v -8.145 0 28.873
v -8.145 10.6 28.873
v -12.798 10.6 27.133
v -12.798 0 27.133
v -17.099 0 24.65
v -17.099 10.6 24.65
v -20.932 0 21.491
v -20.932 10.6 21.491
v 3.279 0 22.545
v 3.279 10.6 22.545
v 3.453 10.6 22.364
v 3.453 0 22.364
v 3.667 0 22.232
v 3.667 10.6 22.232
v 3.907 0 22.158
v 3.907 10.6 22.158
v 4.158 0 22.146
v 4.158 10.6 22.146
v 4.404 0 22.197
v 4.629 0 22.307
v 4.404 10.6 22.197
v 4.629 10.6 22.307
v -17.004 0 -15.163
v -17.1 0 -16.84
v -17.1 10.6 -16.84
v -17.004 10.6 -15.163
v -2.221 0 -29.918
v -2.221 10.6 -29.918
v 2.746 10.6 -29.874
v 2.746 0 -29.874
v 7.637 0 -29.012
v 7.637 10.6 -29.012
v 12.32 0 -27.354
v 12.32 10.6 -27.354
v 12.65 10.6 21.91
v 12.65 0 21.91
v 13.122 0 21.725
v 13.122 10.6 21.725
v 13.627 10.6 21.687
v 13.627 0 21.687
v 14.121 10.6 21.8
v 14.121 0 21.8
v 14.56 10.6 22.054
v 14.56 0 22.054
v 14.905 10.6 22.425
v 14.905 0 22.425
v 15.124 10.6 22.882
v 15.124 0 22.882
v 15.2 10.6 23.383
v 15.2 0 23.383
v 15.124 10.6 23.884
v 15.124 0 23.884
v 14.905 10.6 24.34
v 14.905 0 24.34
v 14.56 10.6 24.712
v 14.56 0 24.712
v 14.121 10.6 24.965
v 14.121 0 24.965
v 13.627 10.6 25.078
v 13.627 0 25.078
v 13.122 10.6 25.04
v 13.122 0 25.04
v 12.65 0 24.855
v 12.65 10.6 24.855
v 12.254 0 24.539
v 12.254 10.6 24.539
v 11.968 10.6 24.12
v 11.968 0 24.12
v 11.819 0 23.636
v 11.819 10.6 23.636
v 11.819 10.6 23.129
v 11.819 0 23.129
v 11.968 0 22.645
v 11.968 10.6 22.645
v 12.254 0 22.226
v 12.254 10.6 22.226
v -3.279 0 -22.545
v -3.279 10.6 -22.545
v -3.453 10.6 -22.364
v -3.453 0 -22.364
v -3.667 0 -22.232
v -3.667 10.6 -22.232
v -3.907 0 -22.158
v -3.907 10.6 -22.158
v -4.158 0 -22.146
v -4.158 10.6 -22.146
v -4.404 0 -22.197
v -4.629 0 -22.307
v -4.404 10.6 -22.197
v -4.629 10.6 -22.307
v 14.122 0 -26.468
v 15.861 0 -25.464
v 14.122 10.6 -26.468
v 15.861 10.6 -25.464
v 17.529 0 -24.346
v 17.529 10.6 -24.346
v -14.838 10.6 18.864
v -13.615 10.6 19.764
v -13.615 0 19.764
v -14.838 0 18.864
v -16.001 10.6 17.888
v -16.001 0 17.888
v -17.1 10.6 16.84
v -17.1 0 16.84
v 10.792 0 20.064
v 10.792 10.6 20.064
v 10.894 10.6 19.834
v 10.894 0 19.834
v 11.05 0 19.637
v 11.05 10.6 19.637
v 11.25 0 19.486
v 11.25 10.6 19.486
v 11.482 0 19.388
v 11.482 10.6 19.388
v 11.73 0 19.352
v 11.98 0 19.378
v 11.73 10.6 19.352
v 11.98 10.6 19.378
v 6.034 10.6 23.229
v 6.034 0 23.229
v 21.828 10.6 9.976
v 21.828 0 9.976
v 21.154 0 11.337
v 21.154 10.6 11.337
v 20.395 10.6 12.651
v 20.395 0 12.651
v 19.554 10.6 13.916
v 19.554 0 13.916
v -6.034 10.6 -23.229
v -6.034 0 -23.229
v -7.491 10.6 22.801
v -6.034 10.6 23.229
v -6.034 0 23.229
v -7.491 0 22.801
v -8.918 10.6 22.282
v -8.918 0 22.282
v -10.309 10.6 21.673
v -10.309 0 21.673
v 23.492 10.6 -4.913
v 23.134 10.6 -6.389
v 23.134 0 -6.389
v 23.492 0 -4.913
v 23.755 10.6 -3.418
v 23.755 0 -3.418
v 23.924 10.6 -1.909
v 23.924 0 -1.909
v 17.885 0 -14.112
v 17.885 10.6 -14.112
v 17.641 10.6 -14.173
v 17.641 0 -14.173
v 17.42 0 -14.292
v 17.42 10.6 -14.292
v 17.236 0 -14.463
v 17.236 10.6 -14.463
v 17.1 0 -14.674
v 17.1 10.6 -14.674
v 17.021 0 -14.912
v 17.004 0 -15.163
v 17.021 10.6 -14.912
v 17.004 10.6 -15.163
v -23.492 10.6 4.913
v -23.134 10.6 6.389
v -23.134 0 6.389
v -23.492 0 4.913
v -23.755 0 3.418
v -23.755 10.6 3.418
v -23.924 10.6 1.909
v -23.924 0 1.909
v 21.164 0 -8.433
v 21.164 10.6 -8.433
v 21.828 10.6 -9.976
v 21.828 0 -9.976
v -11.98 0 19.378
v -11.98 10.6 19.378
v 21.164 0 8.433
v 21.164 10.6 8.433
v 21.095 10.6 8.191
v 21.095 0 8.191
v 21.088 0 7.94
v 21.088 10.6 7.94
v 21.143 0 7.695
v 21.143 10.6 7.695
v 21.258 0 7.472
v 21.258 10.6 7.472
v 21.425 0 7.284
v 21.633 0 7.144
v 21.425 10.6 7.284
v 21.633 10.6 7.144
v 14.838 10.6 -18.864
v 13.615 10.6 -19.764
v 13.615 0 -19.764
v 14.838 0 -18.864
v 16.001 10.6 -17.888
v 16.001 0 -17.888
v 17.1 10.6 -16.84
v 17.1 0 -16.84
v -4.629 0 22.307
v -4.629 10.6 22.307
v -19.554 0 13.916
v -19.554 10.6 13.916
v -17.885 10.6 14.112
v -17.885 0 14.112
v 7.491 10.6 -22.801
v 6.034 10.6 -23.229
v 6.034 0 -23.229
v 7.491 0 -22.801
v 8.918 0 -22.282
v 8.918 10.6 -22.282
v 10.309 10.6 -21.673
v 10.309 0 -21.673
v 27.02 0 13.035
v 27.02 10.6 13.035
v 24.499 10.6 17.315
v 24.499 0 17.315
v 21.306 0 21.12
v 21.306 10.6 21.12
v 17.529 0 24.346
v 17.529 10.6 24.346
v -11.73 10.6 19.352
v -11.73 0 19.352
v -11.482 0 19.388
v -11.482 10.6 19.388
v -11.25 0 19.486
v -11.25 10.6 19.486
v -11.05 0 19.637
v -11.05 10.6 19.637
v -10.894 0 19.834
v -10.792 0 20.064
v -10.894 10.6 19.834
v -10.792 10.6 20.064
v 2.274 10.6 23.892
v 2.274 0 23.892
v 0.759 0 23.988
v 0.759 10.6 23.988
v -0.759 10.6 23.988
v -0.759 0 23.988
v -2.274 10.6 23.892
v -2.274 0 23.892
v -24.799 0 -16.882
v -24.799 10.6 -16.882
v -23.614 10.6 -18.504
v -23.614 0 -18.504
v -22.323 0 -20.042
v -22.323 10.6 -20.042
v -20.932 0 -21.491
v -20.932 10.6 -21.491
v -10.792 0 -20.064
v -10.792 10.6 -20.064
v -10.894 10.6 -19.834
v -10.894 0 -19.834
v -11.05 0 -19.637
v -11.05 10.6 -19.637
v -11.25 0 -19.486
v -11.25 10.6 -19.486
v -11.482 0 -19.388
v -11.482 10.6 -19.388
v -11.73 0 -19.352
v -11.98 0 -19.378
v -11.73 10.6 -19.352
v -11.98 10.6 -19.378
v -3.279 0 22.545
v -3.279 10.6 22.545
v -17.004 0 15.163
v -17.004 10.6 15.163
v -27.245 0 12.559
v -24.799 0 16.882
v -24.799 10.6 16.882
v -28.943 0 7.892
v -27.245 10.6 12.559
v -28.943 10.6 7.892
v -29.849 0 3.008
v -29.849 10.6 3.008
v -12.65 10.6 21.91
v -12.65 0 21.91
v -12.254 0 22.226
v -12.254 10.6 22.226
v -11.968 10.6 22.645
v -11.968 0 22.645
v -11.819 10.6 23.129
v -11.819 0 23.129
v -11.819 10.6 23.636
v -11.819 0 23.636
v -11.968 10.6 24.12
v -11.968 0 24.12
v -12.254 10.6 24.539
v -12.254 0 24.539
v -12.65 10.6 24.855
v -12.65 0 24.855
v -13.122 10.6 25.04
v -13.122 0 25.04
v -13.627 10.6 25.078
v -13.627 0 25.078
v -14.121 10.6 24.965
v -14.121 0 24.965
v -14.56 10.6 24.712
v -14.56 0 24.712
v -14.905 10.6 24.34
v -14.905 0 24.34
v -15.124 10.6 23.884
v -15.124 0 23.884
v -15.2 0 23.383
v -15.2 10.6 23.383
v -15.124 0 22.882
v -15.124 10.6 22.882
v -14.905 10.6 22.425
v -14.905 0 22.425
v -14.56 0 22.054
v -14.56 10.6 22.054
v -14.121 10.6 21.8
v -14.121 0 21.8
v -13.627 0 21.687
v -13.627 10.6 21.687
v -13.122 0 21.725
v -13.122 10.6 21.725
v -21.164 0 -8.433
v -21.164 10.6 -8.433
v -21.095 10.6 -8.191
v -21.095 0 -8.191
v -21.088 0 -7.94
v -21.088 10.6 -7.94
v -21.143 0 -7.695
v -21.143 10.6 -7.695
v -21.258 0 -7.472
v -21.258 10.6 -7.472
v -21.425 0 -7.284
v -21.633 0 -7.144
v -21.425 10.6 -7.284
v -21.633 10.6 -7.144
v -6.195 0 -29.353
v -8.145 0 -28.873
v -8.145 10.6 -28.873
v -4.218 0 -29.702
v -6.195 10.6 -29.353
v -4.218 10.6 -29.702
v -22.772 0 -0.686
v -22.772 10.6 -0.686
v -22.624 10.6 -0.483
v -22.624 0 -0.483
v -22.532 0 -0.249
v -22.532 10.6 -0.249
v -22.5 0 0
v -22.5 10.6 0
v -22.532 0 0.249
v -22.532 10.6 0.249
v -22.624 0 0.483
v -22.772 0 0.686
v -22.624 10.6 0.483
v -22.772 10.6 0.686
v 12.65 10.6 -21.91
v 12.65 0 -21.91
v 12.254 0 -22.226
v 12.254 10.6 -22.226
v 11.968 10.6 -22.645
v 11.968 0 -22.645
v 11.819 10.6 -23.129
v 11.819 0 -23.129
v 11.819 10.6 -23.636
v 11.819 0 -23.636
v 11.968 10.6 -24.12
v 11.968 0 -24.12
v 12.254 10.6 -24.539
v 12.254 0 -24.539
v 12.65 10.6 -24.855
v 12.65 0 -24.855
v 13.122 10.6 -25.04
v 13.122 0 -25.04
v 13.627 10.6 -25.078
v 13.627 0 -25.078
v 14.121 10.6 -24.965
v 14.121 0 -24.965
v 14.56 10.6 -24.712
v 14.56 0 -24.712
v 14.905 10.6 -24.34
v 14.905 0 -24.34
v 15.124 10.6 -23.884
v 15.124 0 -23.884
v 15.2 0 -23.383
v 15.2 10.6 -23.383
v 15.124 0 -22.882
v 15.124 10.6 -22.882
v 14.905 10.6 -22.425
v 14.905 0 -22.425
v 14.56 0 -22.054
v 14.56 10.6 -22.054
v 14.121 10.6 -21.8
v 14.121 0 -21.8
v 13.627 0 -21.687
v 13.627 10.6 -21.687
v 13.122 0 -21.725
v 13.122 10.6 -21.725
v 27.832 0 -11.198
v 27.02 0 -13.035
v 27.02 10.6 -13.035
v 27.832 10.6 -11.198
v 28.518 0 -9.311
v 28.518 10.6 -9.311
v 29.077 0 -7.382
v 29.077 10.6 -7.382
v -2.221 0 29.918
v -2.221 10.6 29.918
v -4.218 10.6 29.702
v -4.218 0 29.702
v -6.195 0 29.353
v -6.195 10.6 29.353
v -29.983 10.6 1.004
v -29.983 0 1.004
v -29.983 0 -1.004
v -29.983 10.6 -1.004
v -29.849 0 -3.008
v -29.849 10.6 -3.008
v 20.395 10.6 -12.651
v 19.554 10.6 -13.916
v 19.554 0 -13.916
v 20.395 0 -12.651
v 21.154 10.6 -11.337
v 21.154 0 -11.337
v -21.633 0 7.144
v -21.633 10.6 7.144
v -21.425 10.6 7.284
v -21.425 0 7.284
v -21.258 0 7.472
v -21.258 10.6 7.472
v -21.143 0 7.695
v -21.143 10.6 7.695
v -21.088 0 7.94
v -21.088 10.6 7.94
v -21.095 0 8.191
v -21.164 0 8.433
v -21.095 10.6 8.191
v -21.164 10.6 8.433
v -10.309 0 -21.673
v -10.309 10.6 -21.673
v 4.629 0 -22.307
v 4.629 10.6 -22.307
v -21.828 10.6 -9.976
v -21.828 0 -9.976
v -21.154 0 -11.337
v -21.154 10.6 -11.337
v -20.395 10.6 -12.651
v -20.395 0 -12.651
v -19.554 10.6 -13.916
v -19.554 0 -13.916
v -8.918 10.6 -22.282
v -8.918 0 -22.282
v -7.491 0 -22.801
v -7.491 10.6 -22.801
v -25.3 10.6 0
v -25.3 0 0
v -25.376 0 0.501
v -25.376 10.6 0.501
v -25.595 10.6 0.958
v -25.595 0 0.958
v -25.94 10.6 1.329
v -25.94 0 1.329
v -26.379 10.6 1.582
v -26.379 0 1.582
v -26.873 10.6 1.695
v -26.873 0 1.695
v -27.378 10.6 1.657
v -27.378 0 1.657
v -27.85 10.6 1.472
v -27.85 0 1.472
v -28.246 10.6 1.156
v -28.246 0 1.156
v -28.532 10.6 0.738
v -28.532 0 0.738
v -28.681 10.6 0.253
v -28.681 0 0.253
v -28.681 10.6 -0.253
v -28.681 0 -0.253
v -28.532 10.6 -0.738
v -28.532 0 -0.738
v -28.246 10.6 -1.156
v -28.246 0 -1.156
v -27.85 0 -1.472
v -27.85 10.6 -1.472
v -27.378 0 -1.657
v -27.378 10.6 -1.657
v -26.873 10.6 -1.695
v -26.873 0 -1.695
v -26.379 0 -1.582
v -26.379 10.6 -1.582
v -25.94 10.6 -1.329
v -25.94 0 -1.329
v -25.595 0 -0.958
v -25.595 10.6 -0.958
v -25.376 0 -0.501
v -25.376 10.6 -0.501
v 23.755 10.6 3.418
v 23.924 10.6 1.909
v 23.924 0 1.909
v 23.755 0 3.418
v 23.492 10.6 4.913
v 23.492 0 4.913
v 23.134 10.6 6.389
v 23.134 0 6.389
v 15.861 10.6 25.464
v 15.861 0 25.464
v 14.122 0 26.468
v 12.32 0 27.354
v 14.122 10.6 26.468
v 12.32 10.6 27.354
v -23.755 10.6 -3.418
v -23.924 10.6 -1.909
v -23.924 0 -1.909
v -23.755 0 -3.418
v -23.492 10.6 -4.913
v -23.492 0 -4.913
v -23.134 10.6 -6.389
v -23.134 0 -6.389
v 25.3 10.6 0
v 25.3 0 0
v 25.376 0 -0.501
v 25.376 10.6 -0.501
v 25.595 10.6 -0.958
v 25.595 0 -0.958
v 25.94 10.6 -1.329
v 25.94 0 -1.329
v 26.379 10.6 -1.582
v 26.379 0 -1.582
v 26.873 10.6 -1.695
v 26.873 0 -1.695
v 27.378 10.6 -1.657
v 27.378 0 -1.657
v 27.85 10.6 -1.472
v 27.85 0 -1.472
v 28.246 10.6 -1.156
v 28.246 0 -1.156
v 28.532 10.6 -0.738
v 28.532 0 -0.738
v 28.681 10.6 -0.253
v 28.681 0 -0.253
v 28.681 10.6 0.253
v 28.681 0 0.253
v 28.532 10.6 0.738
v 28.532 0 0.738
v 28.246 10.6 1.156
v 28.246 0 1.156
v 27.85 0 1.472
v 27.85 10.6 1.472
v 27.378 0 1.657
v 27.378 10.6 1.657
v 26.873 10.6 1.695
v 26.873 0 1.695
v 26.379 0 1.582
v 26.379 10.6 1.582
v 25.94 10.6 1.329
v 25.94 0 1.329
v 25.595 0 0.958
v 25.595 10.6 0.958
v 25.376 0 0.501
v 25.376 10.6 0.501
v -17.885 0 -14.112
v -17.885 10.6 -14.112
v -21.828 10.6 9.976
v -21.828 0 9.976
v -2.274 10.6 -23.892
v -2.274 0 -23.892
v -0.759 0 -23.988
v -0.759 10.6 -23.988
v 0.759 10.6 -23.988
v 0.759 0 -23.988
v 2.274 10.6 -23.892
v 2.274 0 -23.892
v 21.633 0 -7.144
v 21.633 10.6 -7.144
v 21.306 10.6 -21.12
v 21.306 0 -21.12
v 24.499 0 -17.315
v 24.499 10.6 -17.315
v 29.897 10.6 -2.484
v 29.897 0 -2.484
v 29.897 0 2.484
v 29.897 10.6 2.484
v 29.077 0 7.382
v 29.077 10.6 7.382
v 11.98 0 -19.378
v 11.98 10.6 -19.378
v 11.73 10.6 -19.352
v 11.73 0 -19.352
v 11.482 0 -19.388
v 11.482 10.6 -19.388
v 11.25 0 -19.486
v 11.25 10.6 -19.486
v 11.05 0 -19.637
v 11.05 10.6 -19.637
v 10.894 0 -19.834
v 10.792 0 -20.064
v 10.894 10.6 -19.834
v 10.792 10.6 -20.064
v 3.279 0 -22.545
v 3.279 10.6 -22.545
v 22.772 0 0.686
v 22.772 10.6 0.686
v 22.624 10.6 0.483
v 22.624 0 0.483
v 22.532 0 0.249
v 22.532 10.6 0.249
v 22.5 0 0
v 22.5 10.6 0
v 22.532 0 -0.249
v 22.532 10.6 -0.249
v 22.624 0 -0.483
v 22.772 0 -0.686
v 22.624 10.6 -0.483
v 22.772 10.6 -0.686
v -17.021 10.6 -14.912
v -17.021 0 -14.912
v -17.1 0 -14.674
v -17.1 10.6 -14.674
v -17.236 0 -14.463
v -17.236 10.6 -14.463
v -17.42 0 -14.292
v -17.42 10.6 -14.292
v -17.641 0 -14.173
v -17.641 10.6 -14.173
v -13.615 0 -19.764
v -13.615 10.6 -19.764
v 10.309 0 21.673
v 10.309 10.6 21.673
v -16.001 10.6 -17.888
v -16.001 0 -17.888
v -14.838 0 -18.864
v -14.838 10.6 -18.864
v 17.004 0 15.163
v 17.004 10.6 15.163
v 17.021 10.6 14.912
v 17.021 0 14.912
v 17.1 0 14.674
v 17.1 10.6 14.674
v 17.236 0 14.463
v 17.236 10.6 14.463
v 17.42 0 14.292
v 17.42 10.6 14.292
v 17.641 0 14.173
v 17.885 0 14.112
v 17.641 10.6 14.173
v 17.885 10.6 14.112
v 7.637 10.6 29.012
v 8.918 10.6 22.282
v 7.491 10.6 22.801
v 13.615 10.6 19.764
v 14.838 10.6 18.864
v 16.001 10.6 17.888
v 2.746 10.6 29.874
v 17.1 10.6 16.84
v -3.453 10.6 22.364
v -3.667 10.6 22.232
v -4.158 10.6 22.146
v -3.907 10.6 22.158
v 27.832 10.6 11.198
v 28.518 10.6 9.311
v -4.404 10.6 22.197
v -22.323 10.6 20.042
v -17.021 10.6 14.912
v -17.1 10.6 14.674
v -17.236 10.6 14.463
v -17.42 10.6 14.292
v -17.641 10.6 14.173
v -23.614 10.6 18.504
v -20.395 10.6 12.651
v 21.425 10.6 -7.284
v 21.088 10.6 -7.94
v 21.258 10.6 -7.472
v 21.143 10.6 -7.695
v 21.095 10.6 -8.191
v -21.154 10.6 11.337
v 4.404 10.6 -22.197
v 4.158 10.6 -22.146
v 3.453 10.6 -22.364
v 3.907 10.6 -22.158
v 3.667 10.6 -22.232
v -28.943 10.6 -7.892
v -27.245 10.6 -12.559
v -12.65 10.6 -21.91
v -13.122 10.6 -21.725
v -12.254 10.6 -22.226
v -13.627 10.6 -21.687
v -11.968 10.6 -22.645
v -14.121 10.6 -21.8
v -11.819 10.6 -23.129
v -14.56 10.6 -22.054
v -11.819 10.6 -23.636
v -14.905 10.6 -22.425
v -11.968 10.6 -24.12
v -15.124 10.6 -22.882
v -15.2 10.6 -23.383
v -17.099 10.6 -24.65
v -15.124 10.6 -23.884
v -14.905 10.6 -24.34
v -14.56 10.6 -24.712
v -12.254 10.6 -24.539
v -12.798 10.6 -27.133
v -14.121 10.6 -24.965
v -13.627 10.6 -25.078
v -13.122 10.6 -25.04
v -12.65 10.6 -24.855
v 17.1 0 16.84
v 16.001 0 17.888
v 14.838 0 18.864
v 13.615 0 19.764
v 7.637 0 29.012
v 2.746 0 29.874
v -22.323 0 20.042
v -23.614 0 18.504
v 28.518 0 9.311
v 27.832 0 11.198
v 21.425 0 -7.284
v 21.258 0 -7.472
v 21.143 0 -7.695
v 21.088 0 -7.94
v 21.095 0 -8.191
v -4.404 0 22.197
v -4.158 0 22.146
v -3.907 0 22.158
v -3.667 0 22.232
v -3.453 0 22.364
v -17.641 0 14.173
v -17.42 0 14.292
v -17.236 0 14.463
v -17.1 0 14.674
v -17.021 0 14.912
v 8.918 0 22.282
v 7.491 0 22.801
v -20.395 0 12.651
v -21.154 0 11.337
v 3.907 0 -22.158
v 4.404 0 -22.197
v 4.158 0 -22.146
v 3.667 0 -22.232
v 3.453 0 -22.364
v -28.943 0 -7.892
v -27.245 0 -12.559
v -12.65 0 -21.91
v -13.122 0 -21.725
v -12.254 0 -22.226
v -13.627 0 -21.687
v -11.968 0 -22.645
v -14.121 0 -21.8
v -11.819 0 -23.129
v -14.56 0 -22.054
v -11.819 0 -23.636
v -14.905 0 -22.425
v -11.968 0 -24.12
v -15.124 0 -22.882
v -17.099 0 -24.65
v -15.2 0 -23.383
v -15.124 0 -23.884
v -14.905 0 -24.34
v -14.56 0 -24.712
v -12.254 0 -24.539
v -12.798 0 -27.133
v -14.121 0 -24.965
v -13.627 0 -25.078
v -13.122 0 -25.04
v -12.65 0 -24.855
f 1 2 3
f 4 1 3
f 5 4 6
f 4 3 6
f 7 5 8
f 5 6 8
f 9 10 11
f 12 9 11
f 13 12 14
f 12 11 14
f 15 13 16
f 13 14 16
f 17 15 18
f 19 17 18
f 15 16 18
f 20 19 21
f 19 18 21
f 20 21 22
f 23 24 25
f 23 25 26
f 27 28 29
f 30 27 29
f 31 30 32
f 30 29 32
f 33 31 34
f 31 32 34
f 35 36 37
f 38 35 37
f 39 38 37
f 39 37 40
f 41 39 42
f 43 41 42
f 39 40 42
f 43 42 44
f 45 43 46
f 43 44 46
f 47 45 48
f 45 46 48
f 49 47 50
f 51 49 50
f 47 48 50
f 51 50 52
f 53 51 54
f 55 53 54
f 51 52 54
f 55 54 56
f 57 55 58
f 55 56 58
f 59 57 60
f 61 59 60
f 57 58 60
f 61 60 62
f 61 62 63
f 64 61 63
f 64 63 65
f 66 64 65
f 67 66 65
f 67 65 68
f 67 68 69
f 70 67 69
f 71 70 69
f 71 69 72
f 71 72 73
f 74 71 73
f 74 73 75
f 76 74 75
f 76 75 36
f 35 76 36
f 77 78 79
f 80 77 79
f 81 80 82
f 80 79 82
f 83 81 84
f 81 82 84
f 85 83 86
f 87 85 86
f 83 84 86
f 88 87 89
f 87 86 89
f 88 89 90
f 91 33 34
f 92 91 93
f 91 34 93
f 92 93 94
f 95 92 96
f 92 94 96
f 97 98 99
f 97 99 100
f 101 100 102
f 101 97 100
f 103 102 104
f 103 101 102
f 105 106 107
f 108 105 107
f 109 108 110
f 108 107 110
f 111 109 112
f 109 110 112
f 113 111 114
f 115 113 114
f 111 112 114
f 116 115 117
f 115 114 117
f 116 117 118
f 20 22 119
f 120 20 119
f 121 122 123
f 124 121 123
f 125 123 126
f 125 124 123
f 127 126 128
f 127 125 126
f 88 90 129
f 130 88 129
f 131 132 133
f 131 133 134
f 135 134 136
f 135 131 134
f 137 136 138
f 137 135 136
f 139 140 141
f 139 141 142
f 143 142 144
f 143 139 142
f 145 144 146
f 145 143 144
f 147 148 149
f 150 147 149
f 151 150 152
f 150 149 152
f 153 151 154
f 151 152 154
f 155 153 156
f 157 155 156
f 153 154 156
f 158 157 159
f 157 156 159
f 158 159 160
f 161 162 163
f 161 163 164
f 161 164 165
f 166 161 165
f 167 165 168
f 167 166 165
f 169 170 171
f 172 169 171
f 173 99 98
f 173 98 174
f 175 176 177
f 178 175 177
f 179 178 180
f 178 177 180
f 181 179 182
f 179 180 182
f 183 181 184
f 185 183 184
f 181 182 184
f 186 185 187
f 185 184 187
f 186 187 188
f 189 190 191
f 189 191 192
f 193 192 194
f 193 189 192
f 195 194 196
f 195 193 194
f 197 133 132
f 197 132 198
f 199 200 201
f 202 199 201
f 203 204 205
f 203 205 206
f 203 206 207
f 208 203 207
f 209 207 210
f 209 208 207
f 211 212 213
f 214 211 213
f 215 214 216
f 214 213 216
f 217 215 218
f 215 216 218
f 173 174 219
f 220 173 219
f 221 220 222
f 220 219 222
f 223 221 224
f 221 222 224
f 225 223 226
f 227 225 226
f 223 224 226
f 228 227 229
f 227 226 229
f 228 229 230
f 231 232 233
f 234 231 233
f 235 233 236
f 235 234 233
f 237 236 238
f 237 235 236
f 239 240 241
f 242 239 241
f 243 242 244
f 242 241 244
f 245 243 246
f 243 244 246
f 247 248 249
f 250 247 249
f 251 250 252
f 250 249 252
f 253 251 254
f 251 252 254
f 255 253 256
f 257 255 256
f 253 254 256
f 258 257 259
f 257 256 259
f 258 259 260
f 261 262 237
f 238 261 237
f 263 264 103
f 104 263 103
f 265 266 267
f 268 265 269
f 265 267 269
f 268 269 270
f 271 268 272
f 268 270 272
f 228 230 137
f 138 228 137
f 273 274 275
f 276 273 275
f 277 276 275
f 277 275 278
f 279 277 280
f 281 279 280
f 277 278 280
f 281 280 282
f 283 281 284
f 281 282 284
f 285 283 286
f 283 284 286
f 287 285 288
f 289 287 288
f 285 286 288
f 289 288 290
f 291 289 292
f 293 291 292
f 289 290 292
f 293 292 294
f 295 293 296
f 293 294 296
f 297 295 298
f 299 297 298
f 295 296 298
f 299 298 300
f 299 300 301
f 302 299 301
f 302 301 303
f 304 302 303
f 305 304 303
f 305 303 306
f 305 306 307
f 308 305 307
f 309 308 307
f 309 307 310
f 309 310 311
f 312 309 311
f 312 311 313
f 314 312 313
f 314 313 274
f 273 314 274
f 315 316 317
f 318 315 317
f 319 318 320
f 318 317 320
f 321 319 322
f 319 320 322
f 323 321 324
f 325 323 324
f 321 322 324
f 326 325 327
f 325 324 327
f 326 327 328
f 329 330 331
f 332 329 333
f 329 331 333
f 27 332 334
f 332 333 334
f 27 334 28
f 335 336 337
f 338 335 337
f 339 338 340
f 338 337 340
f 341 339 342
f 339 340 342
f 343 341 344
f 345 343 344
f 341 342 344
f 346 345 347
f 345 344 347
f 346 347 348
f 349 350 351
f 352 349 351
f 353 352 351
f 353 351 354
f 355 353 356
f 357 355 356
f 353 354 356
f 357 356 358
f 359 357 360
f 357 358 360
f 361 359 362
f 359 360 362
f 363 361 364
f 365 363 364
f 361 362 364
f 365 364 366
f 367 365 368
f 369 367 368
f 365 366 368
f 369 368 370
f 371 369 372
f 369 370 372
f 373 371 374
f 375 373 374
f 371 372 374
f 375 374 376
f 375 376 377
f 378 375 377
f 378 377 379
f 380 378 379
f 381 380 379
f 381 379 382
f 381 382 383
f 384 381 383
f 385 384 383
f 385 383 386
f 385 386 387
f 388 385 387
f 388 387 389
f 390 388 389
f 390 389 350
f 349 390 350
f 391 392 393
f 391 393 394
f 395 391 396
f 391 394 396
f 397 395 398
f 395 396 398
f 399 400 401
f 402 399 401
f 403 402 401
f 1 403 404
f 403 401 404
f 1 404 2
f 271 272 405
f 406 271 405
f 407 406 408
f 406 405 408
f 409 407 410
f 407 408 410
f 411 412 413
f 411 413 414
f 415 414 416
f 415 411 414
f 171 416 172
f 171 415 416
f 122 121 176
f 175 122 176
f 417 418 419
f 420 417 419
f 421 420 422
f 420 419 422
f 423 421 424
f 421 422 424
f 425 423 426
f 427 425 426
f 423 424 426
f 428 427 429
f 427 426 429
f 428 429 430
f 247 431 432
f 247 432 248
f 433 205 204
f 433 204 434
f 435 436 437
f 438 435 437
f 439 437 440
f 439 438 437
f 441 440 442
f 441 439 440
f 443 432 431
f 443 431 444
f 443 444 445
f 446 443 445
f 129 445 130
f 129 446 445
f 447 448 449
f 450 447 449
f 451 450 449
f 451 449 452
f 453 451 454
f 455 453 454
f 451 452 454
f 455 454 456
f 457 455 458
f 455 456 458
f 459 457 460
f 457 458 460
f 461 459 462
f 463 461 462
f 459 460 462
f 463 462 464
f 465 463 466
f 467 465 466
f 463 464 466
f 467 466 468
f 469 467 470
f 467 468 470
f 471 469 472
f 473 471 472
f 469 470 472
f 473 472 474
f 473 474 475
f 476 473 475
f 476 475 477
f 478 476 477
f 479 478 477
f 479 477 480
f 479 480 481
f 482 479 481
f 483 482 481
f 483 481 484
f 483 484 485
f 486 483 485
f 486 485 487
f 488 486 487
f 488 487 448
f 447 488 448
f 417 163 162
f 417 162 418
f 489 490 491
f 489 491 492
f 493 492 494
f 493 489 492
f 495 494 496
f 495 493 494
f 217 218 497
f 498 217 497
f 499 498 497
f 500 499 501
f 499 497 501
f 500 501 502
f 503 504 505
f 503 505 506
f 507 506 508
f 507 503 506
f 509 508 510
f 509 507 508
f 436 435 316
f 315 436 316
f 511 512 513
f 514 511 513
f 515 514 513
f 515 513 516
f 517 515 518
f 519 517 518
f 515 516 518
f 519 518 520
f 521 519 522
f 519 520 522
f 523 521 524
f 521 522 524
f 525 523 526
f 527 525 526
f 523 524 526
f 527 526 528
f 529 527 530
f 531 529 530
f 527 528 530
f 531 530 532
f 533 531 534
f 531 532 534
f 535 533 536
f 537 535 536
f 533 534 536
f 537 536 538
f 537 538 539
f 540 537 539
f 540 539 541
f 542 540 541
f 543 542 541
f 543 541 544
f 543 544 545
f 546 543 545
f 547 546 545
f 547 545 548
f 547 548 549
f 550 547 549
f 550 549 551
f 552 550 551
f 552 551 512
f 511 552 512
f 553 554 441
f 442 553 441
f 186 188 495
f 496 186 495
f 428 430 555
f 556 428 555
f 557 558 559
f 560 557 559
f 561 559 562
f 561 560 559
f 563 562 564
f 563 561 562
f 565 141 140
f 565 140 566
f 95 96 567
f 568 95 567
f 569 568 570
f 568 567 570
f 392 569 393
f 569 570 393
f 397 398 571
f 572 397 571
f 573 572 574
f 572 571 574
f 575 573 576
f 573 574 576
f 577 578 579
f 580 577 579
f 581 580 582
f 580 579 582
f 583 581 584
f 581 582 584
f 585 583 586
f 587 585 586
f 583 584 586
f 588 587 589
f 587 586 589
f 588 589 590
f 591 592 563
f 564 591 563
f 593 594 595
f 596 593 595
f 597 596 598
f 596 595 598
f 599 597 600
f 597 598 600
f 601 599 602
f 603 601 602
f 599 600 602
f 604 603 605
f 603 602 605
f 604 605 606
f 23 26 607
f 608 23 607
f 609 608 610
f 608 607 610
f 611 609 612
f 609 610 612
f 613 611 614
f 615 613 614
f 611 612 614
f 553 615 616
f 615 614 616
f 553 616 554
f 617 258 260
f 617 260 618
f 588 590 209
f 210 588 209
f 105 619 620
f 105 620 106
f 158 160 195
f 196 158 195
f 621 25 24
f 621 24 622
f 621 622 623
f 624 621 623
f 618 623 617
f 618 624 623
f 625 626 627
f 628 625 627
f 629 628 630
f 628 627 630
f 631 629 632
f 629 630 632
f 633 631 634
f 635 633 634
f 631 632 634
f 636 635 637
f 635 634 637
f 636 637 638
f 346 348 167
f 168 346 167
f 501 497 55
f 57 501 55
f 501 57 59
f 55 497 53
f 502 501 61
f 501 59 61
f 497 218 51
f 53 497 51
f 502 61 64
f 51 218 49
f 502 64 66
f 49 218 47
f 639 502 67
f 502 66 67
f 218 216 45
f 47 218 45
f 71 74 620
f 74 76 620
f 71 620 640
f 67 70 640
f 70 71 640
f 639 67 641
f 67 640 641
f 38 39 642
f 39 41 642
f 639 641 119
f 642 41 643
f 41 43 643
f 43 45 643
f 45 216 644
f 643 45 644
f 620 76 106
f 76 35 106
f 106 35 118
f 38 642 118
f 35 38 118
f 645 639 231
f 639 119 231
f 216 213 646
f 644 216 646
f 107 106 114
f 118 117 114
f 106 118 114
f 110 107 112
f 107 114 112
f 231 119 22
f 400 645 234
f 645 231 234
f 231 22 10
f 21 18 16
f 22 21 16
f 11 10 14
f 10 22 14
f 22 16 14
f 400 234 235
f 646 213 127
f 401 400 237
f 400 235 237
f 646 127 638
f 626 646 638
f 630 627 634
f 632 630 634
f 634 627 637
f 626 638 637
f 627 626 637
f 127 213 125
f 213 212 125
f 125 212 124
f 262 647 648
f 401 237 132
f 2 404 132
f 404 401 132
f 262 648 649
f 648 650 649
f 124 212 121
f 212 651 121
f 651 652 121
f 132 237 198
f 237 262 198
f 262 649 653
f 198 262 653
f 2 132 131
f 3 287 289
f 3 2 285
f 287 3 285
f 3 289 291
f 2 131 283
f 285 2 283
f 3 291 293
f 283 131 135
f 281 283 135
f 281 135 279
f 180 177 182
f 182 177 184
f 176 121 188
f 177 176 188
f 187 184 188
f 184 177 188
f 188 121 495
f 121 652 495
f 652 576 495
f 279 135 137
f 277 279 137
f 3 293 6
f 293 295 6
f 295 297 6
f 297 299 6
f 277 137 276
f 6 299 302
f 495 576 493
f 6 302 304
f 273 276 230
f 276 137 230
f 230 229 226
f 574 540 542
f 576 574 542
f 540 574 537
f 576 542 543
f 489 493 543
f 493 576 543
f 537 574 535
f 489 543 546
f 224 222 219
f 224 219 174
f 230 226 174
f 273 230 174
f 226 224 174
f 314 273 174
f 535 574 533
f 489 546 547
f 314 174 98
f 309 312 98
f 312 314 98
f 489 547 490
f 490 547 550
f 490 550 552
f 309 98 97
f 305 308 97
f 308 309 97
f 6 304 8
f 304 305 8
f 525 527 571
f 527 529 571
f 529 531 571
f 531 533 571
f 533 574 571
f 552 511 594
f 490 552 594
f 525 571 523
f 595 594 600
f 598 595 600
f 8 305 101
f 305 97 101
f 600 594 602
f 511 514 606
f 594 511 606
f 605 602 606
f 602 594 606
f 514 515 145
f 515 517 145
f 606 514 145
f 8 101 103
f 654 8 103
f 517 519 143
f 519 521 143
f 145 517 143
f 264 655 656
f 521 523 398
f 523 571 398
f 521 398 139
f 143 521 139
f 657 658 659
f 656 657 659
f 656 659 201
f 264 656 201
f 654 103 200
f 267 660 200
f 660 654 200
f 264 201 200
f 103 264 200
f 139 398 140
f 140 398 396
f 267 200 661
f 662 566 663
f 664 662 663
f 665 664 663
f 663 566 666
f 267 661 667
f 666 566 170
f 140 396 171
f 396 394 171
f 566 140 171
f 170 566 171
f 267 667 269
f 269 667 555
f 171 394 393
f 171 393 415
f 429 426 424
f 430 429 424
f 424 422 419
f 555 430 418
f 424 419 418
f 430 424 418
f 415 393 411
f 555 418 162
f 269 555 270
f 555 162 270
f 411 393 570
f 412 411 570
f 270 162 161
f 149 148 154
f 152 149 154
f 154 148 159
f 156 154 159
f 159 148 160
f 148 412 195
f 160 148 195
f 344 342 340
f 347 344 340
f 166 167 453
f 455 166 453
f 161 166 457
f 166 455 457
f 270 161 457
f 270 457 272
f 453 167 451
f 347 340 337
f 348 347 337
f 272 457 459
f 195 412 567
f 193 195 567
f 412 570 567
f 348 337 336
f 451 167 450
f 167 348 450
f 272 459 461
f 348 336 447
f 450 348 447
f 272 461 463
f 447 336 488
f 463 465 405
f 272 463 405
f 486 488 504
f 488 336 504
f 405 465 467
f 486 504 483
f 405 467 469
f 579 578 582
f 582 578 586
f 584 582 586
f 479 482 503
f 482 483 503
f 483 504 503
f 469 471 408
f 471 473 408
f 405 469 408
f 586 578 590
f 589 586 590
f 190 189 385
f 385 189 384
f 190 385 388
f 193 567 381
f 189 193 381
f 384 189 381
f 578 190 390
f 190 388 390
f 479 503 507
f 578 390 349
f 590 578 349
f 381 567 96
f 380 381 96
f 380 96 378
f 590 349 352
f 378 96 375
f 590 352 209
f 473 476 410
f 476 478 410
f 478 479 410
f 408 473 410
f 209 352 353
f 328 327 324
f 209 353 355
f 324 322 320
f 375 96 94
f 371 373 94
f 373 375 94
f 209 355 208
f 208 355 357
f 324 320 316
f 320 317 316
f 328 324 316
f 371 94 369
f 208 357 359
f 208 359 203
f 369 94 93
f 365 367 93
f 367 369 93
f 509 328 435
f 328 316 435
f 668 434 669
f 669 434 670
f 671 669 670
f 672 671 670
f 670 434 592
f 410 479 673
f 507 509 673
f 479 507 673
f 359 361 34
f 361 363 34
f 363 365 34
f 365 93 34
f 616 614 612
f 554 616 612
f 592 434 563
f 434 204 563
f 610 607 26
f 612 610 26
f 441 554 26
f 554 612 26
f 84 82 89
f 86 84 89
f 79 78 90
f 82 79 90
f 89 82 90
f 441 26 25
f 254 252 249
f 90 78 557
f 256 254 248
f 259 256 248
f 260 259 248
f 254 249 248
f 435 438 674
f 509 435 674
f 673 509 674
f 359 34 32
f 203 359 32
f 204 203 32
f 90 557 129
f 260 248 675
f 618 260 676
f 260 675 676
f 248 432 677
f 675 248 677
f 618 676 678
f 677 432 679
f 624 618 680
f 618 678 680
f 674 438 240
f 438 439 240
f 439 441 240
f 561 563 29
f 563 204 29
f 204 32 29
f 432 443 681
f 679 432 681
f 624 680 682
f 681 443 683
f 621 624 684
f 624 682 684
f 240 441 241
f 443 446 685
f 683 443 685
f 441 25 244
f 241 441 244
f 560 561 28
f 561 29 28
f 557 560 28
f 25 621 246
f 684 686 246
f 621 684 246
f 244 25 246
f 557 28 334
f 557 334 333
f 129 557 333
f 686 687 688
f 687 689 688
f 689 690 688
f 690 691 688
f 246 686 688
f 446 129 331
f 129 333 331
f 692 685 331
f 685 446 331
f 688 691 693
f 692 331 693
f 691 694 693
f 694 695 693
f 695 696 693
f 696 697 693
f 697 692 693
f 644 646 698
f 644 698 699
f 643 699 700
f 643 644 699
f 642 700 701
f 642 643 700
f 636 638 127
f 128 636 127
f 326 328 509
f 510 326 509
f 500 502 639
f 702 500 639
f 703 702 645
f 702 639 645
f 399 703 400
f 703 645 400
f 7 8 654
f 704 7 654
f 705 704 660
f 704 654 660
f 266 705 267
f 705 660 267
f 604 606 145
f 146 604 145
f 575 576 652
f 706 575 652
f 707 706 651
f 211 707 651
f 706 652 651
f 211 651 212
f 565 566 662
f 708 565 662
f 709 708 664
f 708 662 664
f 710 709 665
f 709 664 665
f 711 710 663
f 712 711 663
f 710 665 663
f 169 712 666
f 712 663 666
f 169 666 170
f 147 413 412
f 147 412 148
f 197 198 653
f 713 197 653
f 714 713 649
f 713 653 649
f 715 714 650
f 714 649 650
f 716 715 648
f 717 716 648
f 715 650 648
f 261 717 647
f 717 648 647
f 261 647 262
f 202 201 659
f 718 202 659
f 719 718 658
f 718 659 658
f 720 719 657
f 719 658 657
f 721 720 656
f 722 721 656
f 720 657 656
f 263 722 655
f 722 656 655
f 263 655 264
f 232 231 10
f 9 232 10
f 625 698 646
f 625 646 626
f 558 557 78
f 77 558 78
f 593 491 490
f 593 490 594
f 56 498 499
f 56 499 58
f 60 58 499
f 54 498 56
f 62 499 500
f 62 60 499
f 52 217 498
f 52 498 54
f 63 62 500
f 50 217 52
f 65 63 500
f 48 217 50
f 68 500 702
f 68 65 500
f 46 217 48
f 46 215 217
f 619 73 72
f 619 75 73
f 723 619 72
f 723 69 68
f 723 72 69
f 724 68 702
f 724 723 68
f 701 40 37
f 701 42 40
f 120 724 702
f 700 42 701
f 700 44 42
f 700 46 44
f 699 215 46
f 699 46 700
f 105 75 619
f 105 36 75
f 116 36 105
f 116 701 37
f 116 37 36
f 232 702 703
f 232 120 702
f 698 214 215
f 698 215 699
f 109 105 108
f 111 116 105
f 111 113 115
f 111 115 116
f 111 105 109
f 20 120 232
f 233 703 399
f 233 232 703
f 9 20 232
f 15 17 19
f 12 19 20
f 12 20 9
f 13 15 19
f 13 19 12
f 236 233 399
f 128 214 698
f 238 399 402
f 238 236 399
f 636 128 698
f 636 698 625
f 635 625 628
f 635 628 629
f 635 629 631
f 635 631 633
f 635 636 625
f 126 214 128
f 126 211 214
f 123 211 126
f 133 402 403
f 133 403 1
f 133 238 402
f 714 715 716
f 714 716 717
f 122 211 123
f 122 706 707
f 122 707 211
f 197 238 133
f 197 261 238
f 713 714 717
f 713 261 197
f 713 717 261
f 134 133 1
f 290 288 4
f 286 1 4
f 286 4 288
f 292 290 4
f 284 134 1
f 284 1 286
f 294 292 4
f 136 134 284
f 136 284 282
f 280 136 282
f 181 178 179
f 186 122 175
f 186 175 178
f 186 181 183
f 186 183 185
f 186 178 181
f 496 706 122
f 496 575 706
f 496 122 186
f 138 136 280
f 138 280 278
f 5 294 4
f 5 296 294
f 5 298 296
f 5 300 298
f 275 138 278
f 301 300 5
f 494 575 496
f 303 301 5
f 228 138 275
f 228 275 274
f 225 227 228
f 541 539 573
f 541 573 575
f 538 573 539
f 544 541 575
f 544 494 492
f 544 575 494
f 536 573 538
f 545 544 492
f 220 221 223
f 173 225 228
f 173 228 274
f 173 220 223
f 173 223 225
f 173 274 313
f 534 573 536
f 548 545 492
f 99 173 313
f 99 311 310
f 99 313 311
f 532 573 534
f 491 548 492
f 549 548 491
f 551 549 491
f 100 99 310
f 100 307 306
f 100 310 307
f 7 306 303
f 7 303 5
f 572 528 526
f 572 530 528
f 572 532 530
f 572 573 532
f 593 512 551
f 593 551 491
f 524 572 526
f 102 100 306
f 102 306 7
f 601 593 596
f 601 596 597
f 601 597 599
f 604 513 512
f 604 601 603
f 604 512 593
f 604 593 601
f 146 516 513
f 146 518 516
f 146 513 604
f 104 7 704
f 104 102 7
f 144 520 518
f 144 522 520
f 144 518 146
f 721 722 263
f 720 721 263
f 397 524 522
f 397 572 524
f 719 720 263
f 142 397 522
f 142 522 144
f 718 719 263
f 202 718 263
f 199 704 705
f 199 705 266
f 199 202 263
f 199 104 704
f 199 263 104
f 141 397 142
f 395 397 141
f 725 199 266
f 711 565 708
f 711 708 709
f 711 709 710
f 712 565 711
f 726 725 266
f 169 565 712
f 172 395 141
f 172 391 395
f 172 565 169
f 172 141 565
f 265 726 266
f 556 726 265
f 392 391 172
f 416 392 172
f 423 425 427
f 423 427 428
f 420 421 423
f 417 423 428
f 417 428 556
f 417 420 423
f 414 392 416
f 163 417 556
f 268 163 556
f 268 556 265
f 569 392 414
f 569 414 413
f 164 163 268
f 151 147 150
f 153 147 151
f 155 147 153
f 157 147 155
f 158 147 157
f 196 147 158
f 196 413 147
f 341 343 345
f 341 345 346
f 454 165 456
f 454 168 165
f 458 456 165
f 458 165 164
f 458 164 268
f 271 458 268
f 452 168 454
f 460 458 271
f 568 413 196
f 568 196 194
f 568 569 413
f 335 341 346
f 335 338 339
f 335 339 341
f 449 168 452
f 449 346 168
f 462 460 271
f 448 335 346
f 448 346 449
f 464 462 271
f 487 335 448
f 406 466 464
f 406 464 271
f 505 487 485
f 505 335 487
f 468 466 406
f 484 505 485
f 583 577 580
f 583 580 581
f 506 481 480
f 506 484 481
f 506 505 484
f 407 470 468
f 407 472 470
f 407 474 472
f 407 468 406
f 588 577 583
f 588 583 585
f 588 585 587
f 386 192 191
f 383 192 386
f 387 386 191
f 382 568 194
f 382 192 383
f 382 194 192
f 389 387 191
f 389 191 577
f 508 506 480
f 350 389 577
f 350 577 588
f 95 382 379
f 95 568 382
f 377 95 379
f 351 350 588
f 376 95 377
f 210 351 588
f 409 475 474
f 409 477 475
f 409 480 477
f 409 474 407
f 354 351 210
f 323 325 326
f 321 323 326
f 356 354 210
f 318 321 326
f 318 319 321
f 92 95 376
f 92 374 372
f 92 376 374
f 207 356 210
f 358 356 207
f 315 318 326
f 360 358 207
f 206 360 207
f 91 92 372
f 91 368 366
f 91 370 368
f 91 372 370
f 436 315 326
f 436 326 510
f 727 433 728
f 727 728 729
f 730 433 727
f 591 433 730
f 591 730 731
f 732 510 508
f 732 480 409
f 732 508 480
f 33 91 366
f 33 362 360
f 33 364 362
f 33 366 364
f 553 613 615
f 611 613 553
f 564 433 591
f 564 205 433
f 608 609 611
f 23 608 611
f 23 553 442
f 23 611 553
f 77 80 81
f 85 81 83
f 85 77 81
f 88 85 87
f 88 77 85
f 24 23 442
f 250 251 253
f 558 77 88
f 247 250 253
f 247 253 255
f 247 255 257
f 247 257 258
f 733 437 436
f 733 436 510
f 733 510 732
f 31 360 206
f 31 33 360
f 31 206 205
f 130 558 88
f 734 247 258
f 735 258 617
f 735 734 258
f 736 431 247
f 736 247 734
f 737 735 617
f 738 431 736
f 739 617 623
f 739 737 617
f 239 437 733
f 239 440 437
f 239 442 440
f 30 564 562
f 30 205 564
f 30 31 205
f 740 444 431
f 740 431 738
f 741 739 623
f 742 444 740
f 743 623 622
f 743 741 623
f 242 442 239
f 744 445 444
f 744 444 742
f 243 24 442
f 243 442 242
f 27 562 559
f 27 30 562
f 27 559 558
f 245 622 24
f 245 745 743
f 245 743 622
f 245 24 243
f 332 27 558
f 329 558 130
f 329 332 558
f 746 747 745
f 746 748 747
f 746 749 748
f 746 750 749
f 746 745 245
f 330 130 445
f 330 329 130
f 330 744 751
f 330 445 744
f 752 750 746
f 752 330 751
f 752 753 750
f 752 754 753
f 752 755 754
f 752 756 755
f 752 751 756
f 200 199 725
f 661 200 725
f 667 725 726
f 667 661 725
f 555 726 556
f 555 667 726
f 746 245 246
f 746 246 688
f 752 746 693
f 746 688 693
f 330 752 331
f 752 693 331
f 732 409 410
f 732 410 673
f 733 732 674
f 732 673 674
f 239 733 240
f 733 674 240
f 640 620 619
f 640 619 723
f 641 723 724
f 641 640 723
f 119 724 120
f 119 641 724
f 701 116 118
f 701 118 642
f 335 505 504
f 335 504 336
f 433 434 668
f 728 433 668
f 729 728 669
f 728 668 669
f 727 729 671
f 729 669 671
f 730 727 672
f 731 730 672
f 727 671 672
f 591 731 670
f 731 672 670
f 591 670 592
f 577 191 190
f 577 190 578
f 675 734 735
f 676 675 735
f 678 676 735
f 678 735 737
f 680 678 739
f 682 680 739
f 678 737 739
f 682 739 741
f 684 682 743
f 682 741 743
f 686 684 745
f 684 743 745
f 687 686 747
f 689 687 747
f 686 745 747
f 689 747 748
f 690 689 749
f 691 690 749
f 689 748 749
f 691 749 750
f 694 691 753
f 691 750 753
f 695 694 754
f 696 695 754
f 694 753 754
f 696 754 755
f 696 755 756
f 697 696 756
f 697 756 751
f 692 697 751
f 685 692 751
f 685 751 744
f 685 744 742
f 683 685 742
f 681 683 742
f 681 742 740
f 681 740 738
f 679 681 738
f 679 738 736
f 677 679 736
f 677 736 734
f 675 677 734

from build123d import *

# Parameters (mm, degrees)
SKETCH1_W            = 6
SKETCH1_H            = 10.6
BOSS_EXTRUDE1_DEPTH  = 10.6
CIRPATTERN2_COUNT    = 18
M3_CLEARANCE_HOLE1_D = 3.4
CIRPATTERN1_COUNT    = 6


with BuildPart() as part:
    # Sketch1 → Revolve1 (revolve)
    with BuildSketch(Plane.XY, mode=Mode.PRIVATE) as revolve1_sk:
        with Locations((27, 5.3)):
            Rectangle(SKETCH1_W, SKETCH1_H)
    revolve(revolve1_sk.sketch.rotate(Axis((0, 22.026442308, 0), (0, -1, 0)), 180), axis=Axis((0, 22.026442308, 0), (0, -1, 0)))

    # Sketch4 → Boss-Extrude1 (add)
    with BuildSketch(Plane(origin=(0, 10.6, 0), x_dir=(1, 0, 0), z_dir=(0, 1, 0))):
        with BuildLine():
            Line((22.771936798, 0.68551001), (29.077470181, 7.382460828))
            ThreePointArc((29.077470181, 7.382460828), (30, 0), (29.077470181, -7.382460828))
            Line((29.077470181, -7.382460828), (22.771936798, -0.68551001))
            ThreePointArc((22.771936798, -0.68551001), (22.5, 0), (22.771936798, 0.68551001))
        make_face()
    boss_extrude1 = extrude(amount=-BOSS_EXTRUDE1_DEPTH)

    # CirPattern2: Boss-Extrude1 ×18 about axis
    cirpattern2_axis = Axis((0, 0, 0), (0, 1, 0))
    for i in range(1, CIRPATTERN2_COUNT):
        add(boss_extrude1.rotate(cirpattern2_axis, i * 360 / CIRPATTERN2_COUNT))

    # M3 Clearance Hole1 (through all)
    with Locations(Plane(origin=(0, 10.6, 0), x_dir=(1, 0, 0), z_dir=(0, 1, 0))):
        with Locations((27, 0)):
            m3_clearance_hole1 = Hole(M3_CLEARANCE_HOLE1_D / 2)

    # CirPattern1: M3 Clearance Hole1 ×6 about axis
    cirpattern1_axis = Axis((0, 0, 0), (0, 1, 0))
    for i in range(1, CIRPATTERN1_COUNT):
        add(m3_clearance_hole1.rotate(cirpattern1_axis, i * 360 / CIRPATTERN1_COUNT), mode=Mode.SUBTRACT)


solid = part.part
